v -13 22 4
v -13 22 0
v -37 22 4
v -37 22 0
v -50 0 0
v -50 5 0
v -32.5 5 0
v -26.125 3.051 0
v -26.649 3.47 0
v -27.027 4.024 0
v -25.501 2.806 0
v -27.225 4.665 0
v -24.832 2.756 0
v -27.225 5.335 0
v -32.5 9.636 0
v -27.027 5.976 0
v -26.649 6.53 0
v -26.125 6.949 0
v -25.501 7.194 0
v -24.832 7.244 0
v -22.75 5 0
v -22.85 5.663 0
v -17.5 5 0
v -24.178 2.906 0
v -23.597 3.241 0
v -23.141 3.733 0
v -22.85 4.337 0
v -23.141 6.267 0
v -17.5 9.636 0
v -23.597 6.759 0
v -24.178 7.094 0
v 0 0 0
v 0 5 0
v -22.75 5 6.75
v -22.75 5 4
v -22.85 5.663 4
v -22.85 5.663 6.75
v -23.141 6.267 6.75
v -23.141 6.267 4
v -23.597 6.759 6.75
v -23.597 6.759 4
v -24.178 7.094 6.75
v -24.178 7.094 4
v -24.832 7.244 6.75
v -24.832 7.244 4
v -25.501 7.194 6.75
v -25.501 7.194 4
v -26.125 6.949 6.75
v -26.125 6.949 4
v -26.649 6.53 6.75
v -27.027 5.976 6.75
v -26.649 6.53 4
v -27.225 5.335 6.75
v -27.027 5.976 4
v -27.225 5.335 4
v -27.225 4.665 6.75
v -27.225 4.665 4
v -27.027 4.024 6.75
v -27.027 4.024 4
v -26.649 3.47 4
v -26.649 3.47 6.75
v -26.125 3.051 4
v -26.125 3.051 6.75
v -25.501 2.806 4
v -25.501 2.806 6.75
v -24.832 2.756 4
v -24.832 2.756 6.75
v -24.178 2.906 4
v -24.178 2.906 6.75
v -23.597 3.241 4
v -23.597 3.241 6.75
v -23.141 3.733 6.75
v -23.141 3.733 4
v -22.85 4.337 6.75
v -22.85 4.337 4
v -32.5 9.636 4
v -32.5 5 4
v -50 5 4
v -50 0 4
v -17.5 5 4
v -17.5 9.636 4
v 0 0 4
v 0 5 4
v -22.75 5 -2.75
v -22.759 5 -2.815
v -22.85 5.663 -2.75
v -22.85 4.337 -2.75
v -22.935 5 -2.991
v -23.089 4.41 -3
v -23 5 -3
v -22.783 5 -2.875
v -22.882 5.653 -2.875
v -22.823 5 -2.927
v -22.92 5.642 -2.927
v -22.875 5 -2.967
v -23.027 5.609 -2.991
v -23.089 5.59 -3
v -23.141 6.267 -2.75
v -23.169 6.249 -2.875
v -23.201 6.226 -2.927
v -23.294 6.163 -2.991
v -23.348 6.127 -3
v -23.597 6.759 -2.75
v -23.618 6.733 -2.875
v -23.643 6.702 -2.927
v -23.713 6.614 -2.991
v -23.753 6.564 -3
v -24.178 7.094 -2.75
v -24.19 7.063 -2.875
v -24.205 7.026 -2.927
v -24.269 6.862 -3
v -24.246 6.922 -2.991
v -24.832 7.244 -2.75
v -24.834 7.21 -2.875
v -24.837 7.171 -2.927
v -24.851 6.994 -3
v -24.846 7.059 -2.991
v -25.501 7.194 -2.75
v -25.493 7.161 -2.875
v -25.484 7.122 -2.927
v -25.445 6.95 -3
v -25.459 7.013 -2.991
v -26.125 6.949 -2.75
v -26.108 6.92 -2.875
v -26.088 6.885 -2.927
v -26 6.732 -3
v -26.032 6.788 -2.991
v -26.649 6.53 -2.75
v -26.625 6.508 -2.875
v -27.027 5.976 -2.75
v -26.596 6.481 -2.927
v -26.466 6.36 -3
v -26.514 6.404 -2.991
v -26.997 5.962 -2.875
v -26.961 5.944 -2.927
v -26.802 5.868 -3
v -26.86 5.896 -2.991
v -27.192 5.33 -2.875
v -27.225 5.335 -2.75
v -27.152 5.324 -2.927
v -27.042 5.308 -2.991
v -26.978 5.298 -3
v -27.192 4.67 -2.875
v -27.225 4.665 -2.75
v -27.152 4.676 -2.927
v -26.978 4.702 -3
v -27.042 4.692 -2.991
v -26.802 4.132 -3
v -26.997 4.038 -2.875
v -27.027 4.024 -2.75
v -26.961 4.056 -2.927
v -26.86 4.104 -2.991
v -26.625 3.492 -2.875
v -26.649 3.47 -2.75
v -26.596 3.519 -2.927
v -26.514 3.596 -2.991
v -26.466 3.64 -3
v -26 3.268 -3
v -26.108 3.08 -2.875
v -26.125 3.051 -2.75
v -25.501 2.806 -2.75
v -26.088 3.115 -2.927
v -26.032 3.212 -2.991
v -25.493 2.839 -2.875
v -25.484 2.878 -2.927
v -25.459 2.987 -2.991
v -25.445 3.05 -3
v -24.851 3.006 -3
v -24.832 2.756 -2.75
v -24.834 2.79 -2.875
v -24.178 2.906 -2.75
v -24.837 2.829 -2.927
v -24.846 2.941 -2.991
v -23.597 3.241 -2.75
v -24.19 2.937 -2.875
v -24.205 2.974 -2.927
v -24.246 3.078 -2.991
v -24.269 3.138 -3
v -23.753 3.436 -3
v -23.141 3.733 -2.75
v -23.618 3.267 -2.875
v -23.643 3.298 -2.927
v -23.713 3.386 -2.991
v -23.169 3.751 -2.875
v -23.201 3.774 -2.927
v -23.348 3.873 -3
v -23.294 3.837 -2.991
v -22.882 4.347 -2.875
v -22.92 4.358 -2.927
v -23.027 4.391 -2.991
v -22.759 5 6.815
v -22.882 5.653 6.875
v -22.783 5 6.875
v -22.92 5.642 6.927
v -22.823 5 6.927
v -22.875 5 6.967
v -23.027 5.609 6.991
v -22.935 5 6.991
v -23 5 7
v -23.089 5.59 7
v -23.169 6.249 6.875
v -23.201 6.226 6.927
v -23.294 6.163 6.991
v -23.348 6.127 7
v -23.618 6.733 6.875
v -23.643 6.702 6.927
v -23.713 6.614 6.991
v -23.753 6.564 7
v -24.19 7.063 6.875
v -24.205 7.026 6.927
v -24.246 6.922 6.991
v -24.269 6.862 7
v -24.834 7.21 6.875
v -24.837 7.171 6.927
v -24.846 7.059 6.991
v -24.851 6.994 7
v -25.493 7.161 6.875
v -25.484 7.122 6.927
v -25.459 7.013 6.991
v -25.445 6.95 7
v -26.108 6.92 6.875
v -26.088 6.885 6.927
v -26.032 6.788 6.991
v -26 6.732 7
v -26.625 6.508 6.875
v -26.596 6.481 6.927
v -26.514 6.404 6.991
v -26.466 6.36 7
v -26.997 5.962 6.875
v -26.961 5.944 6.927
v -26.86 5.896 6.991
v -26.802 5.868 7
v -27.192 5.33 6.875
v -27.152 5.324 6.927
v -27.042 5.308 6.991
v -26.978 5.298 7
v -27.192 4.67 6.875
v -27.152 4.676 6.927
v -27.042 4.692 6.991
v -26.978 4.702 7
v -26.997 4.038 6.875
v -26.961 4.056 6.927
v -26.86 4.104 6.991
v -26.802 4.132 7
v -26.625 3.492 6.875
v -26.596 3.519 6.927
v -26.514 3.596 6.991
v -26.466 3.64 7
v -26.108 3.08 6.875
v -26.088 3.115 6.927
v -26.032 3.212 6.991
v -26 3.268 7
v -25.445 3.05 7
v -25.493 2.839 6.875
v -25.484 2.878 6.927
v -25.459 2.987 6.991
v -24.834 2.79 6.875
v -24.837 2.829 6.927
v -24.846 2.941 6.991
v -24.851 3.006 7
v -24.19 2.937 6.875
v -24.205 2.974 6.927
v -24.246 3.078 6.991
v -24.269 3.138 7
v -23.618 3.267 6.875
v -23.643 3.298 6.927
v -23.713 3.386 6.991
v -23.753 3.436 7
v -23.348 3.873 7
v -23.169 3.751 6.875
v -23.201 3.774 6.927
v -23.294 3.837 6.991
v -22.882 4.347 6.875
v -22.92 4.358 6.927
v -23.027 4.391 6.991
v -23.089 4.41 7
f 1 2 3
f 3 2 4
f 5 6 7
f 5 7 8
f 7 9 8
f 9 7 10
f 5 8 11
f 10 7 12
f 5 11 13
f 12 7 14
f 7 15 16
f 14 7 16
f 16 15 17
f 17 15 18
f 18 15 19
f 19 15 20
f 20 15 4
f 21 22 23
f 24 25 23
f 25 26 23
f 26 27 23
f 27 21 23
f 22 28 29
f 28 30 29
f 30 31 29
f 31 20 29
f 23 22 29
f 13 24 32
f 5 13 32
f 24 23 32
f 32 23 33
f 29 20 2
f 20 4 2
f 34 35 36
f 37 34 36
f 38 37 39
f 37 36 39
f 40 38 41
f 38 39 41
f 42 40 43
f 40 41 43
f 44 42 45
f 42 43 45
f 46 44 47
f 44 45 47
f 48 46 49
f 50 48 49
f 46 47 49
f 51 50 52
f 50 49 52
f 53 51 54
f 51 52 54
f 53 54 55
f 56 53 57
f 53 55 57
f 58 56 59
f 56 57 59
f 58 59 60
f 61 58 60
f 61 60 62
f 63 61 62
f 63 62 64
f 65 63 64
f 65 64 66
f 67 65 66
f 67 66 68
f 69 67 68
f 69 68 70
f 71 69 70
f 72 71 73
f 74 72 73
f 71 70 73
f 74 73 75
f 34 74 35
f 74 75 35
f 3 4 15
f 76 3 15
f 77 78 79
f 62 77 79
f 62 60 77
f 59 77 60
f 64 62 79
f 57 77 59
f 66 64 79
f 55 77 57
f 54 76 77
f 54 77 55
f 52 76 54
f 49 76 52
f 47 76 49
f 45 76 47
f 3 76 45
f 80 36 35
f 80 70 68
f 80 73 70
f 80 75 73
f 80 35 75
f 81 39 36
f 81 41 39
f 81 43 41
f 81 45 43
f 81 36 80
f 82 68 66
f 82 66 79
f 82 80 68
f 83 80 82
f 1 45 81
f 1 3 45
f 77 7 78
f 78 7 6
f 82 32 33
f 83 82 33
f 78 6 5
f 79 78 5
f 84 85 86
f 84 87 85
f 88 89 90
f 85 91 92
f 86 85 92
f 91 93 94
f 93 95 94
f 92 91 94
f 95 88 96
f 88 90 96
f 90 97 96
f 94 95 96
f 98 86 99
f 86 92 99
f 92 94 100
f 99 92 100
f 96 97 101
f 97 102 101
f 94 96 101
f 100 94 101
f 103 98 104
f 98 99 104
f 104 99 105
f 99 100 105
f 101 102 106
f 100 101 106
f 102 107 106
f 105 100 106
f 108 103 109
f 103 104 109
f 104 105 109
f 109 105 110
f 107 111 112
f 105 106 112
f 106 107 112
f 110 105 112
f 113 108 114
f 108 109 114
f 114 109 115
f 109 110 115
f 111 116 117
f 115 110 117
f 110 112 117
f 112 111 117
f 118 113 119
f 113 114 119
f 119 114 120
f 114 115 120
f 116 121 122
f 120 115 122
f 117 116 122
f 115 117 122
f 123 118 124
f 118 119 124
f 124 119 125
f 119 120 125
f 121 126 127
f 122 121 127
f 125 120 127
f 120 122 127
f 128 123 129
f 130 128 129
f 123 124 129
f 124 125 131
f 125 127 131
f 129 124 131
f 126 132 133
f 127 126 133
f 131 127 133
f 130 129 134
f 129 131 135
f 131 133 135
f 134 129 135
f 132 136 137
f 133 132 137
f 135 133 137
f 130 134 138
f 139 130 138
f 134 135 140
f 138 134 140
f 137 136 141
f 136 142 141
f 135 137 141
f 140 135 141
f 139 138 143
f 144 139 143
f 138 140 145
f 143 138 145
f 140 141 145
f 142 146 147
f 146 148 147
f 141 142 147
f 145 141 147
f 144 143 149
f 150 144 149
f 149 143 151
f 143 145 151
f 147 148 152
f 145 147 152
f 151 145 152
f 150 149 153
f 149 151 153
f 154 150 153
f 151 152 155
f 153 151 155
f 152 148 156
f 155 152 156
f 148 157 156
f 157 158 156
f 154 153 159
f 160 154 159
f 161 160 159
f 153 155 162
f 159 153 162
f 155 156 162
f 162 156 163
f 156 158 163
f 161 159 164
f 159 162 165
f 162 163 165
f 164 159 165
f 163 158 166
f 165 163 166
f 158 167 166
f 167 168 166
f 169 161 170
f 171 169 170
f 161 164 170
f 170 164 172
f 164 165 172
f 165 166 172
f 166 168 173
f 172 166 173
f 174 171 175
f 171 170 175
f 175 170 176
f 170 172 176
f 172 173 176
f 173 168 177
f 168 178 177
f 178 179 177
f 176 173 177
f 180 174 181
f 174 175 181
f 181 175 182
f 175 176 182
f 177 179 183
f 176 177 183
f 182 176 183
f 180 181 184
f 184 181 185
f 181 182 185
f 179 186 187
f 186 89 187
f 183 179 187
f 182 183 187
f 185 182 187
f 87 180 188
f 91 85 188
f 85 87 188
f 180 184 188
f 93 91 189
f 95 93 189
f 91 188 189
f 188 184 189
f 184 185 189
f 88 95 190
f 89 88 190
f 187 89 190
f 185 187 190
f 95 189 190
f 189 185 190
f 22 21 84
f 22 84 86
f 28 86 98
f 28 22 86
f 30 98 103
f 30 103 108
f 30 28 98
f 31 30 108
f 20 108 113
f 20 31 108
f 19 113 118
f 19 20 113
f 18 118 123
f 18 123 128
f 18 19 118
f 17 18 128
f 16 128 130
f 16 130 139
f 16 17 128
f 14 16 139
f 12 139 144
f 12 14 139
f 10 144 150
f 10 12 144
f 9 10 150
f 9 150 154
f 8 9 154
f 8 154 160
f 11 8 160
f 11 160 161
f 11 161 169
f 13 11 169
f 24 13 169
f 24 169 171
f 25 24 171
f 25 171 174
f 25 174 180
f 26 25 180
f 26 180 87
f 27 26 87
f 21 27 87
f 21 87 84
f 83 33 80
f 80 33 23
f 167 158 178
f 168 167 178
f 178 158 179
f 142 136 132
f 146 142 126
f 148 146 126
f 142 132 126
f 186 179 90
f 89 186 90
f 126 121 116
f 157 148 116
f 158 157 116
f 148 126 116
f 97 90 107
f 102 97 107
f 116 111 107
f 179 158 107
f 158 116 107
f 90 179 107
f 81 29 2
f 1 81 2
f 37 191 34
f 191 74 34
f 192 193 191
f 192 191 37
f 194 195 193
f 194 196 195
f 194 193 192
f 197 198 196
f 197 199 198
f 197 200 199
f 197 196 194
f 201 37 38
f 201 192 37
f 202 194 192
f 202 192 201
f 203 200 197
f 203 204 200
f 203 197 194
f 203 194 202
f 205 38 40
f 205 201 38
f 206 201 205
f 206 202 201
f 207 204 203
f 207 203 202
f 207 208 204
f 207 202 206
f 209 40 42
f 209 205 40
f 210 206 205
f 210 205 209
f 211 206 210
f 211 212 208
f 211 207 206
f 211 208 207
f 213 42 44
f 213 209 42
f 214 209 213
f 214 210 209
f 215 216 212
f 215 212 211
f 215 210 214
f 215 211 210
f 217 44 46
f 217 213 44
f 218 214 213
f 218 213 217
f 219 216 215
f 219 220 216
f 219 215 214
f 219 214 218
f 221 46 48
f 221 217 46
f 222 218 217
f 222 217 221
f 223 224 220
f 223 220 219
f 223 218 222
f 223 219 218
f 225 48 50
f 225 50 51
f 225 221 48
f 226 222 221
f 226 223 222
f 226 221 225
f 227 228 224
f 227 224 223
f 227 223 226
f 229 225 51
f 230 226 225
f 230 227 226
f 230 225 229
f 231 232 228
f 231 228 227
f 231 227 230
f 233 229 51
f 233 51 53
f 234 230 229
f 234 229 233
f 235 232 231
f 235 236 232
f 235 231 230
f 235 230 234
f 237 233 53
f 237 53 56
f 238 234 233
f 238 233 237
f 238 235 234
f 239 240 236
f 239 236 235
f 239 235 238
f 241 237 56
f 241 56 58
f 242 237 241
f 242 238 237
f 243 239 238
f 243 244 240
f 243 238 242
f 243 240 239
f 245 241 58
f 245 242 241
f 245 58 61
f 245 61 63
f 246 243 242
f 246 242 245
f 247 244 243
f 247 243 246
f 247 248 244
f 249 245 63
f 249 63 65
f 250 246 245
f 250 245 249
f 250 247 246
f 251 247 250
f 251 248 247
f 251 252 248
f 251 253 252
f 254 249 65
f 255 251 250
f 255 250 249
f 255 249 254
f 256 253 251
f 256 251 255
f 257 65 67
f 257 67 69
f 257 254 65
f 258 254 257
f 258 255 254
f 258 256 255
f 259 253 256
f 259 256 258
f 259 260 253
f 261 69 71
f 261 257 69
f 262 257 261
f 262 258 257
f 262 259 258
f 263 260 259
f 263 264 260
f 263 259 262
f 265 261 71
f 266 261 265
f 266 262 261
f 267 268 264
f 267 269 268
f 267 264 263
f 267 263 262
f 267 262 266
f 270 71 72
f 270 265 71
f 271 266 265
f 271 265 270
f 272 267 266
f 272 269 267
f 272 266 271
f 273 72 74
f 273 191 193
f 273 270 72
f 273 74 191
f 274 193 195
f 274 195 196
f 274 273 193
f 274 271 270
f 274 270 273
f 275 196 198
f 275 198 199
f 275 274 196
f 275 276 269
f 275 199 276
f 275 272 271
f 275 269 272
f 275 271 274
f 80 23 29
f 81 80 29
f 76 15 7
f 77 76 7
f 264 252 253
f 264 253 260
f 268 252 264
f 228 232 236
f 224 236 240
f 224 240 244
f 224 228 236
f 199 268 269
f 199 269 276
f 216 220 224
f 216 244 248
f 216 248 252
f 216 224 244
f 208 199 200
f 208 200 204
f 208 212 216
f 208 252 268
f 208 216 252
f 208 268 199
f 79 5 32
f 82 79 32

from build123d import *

# Parameters (mm, degrees)
BOSS_EXTRUDE1_DEPTH      = 4
SKETCH2_R                = 2.25
BOSS_EXTRUDE2_DEPTH      = 3
BOSS_EXTRUDE2_DEPTH_BACK = 7
FILLET1_R                = 0.25


with BuildPart() as part:
    # Sketch1 → Boss-Extrude1 (new body)
    with BuildSketch(Plane.XY):
        Polygon((-50, 0), (0, 0), (0, 5), (-17.5, 5), (-17.5, 9.636351612), (-13, 22), (-37, 22), (-32.5, 9.636351612), (-32.5, 5), (-50, 5), align=None)
    extrude(amount=BOSS_EXTRUDE1_DEPTH)

    # Sketch2 → Boss-Extrude2 (add, two sides)
    with BuildSketch(Plane.XY.offset(4)) as boss_extrude2_sk:
        with Locations((-25, 5)):
            Circle(SKETCH2_R)
    extrude(amount=BOSS_EXTRUDE2_DEPTH)
    extrude(boss_extrude2_sk.sketch, amount=-BOSS_EXTRUDE2_DEPTH_BACK)

    # Fillet1
    fillet1_edges = [part.edges().sort_by_distance(p)[0] for p in [
        (-27.25, 5, -3),
        (-27.25, 5, 7),
    ]]
    fillet(fillet1_edges, radius=FILLET1_R)


solid = part.part
